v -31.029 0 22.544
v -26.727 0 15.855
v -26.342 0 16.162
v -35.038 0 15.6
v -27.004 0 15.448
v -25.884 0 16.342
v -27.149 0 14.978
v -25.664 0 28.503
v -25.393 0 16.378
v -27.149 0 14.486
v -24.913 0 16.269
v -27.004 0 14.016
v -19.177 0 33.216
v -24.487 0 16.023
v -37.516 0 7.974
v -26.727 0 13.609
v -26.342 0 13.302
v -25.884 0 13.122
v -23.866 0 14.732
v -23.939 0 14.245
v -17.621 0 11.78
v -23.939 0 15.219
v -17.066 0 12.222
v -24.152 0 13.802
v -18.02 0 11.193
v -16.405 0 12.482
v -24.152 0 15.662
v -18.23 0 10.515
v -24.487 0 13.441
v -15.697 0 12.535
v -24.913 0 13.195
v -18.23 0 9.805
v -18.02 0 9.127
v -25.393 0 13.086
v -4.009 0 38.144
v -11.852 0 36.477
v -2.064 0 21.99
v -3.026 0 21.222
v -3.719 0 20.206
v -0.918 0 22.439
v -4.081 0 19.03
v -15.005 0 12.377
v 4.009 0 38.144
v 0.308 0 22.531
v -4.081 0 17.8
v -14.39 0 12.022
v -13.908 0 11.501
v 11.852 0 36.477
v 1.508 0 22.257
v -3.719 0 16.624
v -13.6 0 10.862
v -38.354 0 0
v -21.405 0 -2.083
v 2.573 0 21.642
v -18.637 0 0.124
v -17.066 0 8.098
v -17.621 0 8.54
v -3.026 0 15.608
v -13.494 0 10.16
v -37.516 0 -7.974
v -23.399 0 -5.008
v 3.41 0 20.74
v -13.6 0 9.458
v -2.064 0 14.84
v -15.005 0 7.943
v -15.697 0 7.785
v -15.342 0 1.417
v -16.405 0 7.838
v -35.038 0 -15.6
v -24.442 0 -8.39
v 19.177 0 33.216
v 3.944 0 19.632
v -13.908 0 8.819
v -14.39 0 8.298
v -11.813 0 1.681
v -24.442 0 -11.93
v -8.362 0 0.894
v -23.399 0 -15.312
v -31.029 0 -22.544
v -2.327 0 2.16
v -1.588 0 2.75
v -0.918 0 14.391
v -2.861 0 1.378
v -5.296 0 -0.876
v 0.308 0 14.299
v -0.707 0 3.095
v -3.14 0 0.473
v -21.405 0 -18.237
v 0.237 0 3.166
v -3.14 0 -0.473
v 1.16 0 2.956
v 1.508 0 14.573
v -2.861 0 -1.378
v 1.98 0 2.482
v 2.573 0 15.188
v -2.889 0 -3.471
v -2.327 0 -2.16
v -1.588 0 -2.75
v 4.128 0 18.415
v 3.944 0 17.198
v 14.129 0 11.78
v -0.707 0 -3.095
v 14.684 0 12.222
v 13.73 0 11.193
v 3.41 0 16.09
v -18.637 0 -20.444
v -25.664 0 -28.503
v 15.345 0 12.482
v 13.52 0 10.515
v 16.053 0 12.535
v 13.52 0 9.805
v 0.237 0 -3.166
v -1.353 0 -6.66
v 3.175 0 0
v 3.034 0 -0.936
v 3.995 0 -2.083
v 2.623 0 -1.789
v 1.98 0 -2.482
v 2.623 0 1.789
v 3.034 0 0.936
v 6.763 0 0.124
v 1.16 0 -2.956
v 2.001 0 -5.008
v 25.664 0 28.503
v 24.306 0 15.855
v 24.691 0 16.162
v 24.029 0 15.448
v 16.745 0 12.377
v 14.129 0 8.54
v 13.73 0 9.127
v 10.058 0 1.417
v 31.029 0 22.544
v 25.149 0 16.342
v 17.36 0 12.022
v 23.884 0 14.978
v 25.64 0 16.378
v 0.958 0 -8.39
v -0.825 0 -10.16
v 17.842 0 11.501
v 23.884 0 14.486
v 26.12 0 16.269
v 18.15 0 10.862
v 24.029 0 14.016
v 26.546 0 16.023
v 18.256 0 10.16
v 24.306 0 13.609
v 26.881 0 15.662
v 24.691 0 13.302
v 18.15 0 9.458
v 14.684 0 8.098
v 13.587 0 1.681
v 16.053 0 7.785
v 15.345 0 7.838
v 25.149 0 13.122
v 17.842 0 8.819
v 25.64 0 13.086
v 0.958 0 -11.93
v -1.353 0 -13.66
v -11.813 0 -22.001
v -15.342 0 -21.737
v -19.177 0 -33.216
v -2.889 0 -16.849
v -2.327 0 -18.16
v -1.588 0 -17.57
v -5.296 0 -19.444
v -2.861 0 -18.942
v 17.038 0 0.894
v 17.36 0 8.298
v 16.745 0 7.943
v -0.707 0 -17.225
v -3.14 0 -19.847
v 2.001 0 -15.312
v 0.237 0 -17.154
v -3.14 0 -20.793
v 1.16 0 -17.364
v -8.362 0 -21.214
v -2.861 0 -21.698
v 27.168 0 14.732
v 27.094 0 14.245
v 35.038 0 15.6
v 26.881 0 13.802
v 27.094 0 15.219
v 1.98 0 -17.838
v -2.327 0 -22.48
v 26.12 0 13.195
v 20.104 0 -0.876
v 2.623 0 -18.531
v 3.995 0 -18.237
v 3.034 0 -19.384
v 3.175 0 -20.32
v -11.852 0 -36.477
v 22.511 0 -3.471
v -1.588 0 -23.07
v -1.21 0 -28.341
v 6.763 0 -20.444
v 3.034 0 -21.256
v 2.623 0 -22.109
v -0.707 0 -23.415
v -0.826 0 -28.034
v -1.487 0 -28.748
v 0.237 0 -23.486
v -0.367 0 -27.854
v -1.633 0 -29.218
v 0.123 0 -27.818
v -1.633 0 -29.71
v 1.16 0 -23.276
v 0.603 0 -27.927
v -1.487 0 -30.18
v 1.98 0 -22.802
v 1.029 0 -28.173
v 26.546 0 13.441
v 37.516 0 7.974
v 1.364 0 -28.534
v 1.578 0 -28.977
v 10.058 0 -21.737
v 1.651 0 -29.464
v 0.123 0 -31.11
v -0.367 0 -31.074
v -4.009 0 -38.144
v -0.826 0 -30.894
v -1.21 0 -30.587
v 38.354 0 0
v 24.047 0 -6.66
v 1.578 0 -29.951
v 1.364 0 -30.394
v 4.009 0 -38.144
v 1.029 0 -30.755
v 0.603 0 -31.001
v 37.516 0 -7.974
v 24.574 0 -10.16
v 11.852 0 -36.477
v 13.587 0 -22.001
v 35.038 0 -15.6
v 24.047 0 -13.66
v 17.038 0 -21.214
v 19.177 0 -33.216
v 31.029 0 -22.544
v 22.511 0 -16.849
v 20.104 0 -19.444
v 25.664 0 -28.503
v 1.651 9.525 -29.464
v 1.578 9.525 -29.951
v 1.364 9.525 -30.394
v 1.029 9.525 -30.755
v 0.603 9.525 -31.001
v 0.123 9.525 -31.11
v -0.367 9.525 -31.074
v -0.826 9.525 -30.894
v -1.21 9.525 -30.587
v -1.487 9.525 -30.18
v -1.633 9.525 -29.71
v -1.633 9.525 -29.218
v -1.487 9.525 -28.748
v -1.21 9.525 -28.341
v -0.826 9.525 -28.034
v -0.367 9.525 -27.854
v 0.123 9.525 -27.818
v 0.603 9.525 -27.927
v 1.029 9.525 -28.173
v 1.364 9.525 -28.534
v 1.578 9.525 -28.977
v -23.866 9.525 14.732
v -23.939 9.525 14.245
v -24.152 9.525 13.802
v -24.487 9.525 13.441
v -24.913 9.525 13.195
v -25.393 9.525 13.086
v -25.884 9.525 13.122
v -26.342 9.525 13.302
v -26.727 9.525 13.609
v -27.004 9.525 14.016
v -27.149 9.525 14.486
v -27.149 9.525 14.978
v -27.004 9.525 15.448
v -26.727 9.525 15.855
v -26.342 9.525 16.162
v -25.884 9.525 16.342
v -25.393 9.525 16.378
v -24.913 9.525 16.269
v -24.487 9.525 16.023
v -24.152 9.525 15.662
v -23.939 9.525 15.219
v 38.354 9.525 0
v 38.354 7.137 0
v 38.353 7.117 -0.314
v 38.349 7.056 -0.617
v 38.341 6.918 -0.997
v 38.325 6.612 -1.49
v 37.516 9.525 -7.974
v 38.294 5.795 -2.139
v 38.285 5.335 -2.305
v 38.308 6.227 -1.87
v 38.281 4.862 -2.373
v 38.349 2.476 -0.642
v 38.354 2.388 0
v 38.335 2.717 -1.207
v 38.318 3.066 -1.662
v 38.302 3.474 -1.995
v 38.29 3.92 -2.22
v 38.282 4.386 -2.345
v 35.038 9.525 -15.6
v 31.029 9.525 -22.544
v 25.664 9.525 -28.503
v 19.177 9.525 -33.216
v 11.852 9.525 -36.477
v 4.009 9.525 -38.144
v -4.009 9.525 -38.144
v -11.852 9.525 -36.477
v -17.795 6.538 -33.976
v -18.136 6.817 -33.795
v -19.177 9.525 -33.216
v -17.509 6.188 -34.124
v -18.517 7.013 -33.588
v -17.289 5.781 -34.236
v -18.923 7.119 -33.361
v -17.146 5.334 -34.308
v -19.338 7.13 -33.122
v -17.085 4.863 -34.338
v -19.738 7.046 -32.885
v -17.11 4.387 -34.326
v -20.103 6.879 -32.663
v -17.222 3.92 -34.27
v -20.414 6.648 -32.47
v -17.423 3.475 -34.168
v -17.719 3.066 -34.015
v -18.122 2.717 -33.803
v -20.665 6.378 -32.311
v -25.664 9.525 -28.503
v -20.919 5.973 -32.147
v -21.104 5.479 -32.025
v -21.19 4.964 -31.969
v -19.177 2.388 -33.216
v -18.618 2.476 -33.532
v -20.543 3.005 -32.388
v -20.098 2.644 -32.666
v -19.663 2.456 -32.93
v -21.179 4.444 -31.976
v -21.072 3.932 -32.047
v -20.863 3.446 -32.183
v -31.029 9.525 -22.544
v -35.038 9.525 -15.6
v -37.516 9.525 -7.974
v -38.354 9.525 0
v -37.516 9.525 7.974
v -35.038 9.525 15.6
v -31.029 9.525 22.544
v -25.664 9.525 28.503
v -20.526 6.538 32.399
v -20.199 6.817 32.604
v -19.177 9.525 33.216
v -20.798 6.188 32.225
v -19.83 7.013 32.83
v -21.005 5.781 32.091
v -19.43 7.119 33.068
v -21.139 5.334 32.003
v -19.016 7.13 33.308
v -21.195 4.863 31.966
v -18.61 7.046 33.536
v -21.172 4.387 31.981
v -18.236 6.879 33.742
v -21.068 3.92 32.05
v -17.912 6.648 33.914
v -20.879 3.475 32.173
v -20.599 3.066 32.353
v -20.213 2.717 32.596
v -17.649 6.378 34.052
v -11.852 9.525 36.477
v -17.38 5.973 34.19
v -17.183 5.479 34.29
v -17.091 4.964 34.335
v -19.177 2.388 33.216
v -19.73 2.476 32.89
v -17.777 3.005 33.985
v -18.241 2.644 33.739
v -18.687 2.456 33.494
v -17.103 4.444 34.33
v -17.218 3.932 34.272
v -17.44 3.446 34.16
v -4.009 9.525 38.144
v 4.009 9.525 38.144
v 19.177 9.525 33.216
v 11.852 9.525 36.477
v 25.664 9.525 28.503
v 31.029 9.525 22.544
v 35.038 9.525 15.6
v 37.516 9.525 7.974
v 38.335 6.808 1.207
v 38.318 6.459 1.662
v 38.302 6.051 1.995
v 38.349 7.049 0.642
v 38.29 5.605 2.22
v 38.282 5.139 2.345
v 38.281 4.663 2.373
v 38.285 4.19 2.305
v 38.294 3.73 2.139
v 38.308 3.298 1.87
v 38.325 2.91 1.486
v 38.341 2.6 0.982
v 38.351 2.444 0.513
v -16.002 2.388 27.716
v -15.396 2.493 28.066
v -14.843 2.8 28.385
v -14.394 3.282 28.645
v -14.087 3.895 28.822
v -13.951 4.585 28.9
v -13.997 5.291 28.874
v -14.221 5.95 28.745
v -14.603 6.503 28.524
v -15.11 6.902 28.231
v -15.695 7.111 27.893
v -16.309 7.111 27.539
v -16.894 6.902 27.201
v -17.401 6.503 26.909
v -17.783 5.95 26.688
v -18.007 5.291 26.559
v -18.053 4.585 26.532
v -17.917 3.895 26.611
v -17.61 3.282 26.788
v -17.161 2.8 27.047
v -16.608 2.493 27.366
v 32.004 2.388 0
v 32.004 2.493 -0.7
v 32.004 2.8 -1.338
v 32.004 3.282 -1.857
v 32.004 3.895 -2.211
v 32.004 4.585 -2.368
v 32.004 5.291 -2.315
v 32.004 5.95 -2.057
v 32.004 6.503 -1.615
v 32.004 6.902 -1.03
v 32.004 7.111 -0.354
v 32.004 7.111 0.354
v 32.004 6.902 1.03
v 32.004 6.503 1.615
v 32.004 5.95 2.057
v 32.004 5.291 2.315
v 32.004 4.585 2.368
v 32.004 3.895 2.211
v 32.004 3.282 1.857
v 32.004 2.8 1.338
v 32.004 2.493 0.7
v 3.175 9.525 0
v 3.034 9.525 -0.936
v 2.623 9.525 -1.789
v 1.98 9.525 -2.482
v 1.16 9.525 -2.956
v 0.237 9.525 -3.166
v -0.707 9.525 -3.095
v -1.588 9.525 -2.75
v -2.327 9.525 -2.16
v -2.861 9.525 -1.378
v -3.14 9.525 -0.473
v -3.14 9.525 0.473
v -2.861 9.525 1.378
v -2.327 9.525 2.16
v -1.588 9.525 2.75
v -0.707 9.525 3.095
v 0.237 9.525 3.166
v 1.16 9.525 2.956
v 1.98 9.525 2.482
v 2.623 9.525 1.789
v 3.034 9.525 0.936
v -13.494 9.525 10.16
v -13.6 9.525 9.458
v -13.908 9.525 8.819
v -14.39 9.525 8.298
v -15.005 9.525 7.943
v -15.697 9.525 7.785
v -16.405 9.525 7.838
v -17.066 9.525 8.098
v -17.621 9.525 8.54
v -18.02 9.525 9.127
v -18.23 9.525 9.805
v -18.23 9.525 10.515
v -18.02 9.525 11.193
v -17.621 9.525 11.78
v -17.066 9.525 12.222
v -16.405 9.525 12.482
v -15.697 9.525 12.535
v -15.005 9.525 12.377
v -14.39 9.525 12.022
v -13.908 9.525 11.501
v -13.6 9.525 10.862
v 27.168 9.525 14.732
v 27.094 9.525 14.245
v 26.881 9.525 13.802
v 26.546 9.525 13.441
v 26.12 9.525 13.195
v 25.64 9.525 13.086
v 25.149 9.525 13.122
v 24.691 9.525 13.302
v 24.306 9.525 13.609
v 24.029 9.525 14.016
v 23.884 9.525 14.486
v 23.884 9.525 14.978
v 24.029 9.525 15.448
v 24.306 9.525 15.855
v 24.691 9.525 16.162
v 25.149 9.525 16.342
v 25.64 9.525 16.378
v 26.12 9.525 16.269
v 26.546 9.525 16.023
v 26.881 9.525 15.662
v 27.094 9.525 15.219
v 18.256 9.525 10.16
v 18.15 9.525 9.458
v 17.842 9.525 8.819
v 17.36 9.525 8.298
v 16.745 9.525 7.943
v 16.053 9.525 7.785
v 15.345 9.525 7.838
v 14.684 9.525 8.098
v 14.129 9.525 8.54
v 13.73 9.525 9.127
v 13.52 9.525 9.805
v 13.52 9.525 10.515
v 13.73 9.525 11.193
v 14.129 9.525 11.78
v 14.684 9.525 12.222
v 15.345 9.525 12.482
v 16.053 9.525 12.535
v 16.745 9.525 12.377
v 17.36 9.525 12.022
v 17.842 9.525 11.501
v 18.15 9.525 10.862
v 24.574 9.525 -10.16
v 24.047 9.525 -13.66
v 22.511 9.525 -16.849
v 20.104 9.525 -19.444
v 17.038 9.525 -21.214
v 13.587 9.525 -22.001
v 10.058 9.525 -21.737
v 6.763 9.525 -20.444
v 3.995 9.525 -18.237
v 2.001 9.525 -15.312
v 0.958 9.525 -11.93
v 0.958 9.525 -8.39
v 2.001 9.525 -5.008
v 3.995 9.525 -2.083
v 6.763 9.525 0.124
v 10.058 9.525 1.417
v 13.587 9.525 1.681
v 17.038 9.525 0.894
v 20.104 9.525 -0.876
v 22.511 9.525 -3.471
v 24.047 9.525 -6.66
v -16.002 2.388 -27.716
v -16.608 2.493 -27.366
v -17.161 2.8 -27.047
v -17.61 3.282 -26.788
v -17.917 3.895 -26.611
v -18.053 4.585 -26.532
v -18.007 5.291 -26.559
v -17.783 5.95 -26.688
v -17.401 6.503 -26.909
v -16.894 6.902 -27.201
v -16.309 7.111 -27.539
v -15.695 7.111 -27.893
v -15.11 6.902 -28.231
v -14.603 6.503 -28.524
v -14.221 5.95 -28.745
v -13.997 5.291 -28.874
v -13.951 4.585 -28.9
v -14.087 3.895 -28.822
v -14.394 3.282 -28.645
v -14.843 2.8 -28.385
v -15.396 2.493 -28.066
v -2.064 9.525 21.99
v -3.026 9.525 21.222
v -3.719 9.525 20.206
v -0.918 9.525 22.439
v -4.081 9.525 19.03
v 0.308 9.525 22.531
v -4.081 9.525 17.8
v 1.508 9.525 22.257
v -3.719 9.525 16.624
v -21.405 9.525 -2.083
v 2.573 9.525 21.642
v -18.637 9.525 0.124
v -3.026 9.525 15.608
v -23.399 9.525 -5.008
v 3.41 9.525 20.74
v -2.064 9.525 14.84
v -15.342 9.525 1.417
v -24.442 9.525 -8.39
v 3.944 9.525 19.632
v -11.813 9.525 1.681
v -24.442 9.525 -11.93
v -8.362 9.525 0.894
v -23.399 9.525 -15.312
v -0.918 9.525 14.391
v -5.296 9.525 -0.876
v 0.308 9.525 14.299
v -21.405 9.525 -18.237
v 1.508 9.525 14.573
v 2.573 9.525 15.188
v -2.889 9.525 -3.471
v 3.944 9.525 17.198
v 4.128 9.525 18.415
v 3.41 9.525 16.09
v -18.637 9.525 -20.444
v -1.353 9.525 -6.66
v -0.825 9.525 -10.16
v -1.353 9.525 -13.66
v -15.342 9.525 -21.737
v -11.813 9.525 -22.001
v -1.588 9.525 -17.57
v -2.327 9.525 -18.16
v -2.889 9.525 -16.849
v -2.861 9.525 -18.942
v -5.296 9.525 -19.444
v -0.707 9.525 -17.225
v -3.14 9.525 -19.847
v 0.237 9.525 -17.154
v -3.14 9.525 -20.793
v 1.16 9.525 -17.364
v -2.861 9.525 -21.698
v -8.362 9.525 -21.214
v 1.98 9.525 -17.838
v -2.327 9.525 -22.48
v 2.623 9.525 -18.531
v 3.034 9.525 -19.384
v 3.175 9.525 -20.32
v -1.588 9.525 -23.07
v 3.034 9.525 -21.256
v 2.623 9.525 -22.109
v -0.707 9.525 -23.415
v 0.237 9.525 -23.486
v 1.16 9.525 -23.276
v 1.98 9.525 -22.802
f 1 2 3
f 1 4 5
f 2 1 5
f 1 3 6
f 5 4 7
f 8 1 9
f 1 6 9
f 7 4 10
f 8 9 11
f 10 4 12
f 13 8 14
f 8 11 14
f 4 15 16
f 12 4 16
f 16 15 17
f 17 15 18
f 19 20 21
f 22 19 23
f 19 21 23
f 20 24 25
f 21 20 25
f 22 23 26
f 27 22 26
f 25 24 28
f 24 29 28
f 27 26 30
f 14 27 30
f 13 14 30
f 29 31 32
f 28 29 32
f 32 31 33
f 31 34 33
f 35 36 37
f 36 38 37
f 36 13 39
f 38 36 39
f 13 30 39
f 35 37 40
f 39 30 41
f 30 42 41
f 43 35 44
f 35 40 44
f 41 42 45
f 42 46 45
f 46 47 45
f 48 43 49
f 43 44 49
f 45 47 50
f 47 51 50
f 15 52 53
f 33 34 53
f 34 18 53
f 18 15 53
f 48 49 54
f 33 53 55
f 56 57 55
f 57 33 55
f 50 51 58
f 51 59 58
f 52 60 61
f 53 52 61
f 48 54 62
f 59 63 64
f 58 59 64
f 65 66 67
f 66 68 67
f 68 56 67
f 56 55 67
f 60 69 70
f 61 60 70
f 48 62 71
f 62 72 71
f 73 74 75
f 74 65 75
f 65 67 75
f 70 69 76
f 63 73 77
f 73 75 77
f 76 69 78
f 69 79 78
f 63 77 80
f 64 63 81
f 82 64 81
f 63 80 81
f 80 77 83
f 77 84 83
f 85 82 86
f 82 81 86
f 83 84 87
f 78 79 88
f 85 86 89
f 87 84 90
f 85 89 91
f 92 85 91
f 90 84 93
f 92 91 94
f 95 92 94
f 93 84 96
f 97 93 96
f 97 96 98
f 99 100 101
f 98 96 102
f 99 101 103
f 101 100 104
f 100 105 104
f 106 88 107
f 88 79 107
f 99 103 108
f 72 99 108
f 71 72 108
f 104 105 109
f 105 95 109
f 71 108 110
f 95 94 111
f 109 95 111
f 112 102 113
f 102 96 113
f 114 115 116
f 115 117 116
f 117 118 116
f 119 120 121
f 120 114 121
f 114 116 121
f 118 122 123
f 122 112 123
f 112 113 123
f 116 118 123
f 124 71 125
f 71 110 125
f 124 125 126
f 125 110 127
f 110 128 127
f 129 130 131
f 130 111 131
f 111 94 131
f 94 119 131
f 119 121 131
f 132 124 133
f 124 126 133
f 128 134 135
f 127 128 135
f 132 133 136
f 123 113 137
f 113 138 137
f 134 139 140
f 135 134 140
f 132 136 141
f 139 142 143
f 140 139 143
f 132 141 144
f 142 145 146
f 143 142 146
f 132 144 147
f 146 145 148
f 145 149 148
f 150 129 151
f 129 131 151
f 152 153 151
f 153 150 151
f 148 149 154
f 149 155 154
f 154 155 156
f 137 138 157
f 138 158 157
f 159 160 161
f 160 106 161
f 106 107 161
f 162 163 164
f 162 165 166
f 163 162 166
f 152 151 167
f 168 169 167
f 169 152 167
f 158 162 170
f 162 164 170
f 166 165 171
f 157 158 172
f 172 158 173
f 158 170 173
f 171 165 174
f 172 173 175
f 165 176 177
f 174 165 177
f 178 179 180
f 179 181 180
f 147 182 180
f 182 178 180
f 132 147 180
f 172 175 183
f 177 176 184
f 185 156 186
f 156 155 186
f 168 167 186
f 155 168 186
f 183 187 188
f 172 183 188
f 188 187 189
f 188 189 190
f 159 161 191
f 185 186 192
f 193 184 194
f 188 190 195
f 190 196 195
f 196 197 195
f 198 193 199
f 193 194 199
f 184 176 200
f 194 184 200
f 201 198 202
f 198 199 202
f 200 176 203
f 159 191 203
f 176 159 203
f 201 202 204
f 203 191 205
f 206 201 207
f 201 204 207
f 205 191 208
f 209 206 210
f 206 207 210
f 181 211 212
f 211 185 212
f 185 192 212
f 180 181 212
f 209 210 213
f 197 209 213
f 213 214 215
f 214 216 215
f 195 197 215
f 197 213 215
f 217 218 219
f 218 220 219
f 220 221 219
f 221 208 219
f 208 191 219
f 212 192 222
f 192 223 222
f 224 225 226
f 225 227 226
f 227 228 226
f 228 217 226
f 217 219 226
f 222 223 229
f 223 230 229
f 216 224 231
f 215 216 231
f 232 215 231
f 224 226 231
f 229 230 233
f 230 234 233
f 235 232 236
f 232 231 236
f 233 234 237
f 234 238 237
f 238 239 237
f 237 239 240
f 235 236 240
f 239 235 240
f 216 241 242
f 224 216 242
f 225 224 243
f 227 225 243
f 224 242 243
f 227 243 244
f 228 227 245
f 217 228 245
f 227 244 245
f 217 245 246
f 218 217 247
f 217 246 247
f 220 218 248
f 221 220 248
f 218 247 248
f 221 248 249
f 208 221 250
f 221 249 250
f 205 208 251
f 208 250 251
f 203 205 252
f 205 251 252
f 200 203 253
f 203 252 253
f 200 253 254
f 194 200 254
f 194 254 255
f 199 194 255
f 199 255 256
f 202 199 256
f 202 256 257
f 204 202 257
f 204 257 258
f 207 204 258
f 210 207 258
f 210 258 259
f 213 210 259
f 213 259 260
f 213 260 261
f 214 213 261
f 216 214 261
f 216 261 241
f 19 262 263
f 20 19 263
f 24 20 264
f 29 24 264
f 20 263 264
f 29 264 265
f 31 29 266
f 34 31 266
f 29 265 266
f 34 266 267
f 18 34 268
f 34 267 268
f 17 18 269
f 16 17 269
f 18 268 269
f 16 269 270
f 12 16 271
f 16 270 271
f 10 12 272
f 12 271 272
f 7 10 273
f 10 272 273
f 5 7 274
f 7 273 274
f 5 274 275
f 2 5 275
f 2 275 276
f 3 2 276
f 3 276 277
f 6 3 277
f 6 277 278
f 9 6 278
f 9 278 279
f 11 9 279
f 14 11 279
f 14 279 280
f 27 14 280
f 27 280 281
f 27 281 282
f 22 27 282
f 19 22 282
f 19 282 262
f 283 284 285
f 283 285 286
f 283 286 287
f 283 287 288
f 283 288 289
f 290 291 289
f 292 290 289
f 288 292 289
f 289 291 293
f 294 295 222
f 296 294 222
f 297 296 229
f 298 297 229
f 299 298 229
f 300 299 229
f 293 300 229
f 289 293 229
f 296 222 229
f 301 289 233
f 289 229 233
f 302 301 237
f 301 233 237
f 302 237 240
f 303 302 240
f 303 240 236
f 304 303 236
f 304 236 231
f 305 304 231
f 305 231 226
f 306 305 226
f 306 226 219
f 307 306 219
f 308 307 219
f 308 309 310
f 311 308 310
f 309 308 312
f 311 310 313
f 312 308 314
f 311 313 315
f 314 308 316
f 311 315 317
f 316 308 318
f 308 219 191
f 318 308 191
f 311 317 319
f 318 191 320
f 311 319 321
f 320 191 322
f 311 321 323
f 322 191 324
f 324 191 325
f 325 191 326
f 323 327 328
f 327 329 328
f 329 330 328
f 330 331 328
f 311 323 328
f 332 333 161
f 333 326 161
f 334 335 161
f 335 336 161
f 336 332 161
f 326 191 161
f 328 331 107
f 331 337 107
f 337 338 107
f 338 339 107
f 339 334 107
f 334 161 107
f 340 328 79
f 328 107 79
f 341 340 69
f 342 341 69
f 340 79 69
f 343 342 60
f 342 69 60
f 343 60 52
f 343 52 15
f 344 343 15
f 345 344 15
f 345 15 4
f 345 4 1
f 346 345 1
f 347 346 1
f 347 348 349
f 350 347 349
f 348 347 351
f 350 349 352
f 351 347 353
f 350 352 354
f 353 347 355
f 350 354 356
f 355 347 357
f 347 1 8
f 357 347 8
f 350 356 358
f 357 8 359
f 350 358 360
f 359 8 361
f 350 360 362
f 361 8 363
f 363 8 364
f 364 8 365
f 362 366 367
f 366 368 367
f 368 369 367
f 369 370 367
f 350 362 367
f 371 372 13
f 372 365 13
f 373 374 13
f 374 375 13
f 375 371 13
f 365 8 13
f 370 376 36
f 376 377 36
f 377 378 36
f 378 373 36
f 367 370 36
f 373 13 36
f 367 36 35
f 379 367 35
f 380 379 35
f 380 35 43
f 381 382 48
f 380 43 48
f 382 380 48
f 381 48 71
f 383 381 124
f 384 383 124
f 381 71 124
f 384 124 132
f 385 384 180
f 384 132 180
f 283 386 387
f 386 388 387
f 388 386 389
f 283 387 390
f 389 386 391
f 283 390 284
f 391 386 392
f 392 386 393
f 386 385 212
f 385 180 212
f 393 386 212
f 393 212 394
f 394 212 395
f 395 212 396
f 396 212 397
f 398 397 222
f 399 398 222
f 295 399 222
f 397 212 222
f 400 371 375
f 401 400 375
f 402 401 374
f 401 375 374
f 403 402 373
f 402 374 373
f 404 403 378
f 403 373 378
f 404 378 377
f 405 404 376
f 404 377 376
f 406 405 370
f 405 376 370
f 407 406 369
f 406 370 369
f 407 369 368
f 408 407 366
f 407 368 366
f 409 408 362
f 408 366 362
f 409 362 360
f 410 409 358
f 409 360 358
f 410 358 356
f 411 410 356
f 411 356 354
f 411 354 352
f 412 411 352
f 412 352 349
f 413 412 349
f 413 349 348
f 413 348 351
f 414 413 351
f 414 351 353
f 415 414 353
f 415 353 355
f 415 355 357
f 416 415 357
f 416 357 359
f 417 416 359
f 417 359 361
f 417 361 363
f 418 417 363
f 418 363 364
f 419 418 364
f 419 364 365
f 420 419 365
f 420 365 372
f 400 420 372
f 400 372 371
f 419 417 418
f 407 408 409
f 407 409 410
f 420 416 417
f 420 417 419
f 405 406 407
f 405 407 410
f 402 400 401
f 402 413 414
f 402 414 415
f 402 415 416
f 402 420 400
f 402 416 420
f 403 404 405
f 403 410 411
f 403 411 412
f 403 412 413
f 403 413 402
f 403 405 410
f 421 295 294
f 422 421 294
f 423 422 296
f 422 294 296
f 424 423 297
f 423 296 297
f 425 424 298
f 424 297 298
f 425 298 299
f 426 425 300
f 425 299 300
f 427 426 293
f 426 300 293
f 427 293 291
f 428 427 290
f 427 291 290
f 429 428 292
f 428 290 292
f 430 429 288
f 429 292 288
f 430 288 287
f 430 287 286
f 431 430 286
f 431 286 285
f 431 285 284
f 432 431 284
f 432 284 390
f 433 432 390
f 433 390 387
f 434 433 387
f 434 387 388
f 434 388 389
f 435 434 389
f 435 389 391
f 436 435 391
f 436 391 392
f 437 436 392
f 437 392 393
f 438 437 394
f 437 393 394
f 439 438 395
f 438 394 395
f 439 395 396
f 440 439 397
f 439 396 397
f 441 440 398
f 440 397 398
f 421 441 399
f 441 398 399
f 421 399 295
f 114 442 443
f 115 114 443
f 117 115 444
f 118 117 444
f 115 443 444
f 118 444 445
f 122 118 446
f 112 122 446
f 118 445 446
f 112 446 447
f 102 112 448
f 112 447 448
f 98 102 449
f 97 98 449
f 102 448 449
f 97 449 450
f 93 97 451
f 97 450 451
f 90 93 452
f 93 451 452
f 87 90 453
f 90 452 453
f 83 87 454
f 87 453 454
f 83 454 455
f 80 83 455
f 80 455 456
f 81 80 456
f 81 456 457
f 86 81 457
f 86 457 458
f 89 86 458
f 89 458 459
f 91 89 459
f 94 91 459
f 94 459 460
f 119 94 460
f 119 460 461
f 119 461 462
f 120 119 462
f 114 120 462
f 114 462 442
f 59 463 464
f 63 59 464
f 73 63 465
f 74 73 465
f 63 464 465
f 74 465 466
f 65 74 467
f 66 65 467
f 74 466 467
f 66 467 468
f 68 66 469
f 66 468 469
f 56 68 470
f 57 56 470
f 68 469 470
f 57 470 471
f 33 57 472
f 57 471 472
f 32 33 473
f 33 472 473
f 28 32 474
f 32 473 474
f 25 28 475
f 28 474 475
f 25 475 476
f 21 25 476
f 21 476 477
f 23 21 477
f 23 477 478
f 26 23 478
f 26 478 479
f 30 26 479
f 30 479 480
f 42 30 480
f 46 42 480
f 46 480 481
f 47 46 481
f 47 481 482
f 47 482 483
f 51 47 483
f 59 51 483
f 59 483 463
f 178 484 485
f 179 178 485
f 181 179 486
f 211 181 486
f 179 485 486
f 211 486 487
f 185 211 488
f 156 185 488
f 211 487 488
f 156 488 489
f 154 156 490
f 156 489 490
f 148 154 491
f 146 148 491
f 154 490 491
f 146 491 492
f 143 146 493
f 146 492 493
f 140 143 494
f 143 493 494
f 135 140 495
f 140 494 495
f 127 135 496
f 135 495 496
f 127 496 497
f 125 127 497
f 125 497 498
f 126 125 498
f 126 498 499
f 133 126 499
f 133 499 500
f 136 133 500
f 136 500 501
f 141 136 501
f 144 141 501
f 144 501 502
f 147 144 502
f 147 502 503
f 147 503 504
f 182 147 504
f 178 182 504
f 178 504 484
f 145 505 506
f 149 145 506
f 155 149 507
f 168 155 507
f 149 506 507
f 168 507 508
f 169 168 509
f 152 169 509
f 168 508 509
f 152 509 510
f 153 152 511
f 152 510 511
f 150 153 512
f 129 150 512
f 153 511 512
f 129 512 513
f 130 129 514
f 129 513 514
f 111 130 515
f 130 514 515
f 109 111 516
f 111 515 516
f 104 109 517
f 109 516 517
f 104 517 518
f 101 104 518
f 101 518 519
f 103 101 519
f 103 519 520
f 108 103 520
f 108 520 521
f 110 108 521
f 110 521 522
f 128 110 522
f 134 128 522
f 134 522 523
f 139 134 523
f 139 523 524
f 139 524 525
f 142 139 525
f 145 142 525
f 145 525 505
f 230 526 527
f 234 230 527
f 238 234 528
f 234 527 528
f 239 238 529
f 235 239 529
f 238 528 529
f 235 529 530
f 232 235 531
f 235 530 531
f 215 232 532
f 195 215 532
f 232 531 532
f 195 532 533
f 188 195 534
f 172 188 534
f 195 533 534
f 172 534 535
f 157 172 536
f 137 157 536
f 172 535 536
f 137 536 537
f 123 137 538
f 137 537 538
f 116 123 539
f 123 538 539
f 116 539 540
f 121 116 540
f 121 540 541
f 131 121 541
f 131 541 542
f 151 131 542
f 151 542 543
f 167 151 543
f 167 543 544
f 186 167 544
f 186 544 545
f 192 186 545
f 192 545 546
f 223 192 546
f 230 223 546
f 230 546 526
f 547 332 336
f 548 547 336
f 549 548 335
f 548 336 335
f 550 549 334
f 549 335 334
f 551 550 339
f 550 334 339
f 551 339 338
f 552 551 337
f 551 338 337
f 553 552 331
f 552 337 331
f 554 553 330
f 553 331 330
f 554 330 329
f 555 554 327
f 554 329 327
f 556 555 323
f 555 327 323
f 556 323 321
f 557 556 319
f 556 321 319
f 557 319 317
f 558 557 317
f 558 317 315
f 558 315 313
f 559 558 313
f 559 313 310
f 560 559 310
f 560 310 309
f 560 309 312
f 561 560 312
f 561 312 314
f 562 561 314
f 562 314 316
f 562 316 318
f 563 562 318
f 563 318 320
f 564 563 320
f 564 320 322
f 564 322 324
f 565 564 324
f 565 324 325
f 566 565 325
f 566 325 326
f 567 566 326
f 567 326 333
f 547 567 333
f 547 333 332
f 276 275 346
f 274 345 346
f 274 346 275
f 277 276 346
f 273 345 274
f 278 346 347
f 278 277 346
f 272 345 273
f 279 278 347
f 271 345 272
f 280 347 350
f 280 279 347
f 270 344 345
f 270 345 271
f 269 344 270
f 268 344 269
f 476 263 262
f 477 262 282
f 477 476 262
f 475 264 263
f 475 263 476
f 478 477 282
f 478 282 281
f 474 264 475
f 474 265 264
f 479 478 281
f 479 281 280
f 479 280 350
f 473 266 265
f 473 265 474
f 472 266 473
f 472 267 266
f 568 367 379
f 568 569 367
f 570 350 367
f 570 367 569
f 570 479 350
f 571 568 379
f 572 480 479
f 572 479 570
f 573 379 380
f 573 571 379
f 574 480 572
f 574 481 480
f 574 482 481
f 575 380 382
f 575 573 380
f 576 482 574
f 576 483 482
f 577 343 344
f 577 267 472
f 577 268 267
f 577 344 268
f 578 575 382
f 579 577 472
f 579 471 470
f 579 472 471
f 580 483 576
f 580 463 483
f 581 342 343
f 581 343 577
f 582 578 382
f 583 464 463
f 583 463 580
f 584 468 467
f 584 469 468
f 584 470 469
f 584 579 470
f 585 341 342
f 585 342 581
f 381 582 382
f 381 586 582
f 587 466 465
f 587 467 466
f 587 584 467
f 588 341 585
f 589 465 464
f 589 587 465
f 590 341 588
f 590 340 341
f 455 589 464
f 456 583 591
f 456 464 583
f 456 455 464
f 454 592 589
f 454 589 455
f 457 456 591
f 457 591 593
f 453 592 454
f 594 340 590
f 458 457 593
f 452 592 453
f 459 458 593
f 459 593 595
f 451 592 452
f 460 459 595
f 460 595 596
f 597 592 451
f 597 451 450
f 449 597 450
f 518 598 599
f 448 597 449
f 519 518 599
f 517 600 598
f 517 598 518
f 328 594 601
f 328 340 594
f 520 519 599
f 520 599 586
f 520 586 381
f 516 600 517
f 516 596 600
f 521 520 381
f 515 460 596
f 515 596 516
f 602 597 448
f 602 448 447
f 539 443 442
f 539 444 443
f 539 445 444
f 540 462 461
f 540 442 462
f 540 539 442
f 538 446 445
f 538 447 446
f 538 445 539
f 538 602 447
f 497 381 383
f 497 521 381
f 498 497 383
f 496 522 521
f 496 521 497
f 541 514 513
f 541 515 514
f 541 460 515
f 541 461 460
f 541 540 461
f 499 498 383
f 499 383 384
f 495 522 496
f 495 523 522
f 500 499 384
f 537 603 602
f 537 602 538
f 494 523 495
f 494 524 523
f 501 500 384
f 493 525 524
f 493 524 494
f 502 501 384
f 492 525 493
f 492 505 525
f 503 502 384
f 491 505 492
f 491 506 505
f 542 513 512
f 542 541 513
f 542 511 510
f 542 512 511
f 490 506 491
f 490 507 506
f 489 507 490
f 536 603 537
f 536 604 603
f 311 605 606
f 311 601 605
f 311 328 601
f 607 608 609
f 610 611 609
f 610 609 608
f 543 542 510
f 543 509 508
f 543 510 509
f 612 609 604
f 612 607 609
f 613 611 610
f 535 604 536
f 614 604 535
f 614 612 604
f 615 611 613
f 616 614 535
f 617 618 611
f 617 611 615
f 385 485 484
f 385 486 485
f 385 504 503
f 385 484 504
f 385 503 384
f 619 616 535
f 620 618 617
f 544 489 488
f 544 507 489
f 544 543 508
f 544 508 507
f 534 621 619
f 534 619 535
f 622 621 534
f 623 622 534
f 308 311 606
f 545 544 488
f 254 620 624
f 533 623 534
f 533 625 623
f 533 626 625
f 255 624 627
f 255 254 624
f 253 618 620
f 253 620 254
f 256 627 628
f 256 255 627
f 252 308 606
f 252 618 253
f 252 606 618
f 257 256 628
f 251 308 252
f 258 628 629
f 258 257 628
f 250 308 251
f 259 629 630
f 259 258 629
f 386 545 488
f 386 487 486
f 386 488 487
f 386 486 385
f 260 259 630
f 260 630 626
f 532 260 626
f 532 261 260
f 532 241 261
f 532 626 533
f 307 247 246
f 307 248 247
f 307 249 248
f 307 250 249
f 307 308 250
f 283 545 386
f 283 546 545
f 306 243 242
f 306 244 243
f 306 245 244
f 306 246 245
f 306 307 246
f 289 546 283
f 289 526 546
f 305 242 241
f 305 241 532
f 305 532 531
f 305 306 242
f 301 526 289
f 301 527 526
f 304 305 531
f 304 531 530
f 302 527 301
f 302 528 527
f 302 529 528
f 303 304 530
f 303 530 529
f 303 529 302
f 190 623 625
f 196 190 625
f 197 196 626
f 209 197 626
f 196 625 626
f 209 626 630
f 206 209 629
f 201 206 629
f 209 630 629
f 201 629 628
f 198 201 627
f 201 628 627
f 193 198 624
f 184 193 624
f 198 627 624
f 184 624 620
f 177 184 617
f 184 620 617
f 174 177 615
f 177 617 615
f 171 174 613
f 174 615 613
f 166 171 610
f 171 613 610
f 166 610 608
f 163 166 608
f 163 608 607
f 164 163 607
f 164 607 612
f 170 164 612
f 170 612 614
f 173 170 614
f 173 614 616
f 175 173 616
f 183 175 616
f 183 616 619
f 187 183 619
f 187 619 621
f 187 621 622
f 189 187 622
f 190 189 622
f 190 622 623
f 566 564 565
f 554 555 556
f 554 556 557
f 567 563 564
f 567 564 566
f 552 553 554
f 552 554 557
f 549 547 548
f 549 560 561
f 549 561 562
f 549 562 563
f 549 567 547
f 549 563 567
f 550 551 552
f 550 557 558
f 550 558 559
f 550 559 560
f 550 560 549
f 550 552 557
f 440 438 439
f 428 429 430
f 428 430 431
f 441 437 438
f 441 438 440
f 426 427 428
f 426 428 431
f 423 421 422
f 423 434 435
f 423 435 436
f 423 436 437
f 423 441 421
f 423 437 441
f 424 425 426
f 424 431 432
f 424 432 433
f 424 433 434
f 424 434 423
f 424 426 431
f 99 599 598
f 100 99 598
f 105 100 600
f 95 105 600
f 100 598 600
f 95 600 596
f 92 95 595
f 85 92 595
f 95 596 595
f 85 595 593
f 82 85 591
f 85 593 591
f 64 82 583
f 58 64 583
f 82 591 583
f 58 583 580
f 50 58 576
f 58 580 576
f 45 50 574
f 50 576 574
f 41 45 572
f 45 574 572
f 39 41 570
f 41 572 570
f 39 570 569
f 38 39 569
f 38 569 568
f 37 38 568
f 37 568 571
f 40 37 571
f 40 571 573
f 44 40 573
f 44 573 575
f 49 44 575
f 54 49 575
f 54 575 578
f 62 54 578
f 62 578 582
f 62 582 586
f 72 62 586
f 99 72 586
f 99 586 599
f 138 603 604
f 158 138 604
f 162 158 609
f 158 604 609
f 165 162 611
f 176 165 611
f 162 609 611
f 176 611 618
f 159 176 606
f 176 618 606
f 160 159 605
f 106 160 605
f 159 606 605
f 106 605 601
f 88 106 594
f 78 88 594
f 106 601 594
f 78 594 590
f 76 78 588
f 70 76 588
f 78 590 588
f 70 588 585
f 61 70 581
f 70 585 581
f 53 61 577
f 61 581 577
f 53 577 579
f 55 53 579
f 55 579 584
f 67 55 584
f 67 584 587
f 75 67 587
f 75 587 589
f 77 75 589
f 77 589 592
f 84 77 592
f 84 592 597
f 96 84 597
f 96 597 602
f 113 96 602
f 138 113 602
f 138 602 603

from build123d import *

# Parameters (mm, degrees)
SKETCH1_R               = 38.354
BOSS_EXTRUDE1_DEPTH     = 9.525
SKETCH2_R               = 1.651
SKETCH2_R_2             = 4.1275
SKETCH2_R_3             = 11.8745
SKETCH2_R_4             = 3.175
CUT_EXTRUDE1_DEPTH      = 56.070720506
SKETCH4_R               = 2.3749
CUT_EXTRUDE2_DEPTH      = 6.35
CIRPATTERN1_COUNT       = 3
CUT_EXTRUDE3_DEPTH      = 56.070720662
CUT_EXTRUDE3_DEPTH_BACK = 56.070720662
SKETCH5_R               = 2.38125


with BuildPart() as part:
    # Sketch1 → Boss-Extrude1 (new body)
    with BuildSketch(Plane(origin=(0, 0, 0), x_dir=(1, 0, 0), z_dir=(0, 1, 0))):
        Circle(SKETCH1_R)
    extrude(amount=BOSS_EXTRUDE1_DEPTH)

    # Sketch2 → Cut-Extrude1 (cut, through all)
    with BuildSketch(Plane(origin=(0, 9.525, 0), x_dir=(1, 0, 0), z_dir=(0, 1, 0))):
        with Locations((0, 29.464)):
            Circle(SKETCH2_R)
        with Locations((25.516572497, -14.732)):
            Circle(SKETCH2_R)
        with Locations((-25.516572497, -14.732)):
            Circle(SKETCH2_R)
        with Locations((0, -18.415)):
            Circle(SKETCH2_R_2)
        with Locations((-12.7, 10.16)):
            Circle(SKETCH2_R_3)
        with Locations((12.7, 10.16)):
            Circle(SKETCH2_R_3)
        with Locations((0, 20.32)):
            Circle(SKETCH2_R_4)
        Circle(SKETCH2_R_4)
    extrude(amount=-CUT_EXTRUDE1_DEPTH, mode=Mode.SUBTRACT)

    # Sketch4 → Cut-Extrude2 (cut)
    with BuildSketch(Plane(origin=(-19.177, 0, -33.215538337), x_dir=(0, -1, 0), z_dir=(-0.499999999999998, 0, -0.8660254037844398))):
        with Locations((-4.7625, 0)):
            Circle(SKETCH4_R)
    cut_extrude2 = extrude(amount=-CUT_EXTRUDE2_DEPTH, mode=Mode.SUBTRACT)

    # CirPattern1: Cut-Extrude2 ×3 about axis
    cirpattern1_axis = Axis((0, 10.00125, 0), (0, -1, 0))
    for i in range(1, CIRPATTERN1_COUNT):
        add(cut_extrude2.rotate(cirpattern1_axis, i * 360 / CIRPATTERN1_COUNT), mode=Mode.SUBTRACT)

    # Sketch5 → Cut-Extrude3 (cut, two sides: drawn at the far end of the back side and taken through both)
    with BuildSketch(Plane(origin=(0, 9.525, 0), x_dir=(1, 0, 0), z_dir=(0, 1, 0)).offset(-CUT_EXTRUDE3_DEPTH_BACK)):
        with Locations((-15.875, -10.16)):
            Circle(SKETCH5_R)
        with Locations((15.875, -10.16)):
            Circle(SKETCH5_R)
    extrude(amount=CUT_EXTRUDE3_DEPTH + CUT_EXTRUDE3_DEPTH_BACK, mode=Mode.SUBTRACT)


solid = part.part
